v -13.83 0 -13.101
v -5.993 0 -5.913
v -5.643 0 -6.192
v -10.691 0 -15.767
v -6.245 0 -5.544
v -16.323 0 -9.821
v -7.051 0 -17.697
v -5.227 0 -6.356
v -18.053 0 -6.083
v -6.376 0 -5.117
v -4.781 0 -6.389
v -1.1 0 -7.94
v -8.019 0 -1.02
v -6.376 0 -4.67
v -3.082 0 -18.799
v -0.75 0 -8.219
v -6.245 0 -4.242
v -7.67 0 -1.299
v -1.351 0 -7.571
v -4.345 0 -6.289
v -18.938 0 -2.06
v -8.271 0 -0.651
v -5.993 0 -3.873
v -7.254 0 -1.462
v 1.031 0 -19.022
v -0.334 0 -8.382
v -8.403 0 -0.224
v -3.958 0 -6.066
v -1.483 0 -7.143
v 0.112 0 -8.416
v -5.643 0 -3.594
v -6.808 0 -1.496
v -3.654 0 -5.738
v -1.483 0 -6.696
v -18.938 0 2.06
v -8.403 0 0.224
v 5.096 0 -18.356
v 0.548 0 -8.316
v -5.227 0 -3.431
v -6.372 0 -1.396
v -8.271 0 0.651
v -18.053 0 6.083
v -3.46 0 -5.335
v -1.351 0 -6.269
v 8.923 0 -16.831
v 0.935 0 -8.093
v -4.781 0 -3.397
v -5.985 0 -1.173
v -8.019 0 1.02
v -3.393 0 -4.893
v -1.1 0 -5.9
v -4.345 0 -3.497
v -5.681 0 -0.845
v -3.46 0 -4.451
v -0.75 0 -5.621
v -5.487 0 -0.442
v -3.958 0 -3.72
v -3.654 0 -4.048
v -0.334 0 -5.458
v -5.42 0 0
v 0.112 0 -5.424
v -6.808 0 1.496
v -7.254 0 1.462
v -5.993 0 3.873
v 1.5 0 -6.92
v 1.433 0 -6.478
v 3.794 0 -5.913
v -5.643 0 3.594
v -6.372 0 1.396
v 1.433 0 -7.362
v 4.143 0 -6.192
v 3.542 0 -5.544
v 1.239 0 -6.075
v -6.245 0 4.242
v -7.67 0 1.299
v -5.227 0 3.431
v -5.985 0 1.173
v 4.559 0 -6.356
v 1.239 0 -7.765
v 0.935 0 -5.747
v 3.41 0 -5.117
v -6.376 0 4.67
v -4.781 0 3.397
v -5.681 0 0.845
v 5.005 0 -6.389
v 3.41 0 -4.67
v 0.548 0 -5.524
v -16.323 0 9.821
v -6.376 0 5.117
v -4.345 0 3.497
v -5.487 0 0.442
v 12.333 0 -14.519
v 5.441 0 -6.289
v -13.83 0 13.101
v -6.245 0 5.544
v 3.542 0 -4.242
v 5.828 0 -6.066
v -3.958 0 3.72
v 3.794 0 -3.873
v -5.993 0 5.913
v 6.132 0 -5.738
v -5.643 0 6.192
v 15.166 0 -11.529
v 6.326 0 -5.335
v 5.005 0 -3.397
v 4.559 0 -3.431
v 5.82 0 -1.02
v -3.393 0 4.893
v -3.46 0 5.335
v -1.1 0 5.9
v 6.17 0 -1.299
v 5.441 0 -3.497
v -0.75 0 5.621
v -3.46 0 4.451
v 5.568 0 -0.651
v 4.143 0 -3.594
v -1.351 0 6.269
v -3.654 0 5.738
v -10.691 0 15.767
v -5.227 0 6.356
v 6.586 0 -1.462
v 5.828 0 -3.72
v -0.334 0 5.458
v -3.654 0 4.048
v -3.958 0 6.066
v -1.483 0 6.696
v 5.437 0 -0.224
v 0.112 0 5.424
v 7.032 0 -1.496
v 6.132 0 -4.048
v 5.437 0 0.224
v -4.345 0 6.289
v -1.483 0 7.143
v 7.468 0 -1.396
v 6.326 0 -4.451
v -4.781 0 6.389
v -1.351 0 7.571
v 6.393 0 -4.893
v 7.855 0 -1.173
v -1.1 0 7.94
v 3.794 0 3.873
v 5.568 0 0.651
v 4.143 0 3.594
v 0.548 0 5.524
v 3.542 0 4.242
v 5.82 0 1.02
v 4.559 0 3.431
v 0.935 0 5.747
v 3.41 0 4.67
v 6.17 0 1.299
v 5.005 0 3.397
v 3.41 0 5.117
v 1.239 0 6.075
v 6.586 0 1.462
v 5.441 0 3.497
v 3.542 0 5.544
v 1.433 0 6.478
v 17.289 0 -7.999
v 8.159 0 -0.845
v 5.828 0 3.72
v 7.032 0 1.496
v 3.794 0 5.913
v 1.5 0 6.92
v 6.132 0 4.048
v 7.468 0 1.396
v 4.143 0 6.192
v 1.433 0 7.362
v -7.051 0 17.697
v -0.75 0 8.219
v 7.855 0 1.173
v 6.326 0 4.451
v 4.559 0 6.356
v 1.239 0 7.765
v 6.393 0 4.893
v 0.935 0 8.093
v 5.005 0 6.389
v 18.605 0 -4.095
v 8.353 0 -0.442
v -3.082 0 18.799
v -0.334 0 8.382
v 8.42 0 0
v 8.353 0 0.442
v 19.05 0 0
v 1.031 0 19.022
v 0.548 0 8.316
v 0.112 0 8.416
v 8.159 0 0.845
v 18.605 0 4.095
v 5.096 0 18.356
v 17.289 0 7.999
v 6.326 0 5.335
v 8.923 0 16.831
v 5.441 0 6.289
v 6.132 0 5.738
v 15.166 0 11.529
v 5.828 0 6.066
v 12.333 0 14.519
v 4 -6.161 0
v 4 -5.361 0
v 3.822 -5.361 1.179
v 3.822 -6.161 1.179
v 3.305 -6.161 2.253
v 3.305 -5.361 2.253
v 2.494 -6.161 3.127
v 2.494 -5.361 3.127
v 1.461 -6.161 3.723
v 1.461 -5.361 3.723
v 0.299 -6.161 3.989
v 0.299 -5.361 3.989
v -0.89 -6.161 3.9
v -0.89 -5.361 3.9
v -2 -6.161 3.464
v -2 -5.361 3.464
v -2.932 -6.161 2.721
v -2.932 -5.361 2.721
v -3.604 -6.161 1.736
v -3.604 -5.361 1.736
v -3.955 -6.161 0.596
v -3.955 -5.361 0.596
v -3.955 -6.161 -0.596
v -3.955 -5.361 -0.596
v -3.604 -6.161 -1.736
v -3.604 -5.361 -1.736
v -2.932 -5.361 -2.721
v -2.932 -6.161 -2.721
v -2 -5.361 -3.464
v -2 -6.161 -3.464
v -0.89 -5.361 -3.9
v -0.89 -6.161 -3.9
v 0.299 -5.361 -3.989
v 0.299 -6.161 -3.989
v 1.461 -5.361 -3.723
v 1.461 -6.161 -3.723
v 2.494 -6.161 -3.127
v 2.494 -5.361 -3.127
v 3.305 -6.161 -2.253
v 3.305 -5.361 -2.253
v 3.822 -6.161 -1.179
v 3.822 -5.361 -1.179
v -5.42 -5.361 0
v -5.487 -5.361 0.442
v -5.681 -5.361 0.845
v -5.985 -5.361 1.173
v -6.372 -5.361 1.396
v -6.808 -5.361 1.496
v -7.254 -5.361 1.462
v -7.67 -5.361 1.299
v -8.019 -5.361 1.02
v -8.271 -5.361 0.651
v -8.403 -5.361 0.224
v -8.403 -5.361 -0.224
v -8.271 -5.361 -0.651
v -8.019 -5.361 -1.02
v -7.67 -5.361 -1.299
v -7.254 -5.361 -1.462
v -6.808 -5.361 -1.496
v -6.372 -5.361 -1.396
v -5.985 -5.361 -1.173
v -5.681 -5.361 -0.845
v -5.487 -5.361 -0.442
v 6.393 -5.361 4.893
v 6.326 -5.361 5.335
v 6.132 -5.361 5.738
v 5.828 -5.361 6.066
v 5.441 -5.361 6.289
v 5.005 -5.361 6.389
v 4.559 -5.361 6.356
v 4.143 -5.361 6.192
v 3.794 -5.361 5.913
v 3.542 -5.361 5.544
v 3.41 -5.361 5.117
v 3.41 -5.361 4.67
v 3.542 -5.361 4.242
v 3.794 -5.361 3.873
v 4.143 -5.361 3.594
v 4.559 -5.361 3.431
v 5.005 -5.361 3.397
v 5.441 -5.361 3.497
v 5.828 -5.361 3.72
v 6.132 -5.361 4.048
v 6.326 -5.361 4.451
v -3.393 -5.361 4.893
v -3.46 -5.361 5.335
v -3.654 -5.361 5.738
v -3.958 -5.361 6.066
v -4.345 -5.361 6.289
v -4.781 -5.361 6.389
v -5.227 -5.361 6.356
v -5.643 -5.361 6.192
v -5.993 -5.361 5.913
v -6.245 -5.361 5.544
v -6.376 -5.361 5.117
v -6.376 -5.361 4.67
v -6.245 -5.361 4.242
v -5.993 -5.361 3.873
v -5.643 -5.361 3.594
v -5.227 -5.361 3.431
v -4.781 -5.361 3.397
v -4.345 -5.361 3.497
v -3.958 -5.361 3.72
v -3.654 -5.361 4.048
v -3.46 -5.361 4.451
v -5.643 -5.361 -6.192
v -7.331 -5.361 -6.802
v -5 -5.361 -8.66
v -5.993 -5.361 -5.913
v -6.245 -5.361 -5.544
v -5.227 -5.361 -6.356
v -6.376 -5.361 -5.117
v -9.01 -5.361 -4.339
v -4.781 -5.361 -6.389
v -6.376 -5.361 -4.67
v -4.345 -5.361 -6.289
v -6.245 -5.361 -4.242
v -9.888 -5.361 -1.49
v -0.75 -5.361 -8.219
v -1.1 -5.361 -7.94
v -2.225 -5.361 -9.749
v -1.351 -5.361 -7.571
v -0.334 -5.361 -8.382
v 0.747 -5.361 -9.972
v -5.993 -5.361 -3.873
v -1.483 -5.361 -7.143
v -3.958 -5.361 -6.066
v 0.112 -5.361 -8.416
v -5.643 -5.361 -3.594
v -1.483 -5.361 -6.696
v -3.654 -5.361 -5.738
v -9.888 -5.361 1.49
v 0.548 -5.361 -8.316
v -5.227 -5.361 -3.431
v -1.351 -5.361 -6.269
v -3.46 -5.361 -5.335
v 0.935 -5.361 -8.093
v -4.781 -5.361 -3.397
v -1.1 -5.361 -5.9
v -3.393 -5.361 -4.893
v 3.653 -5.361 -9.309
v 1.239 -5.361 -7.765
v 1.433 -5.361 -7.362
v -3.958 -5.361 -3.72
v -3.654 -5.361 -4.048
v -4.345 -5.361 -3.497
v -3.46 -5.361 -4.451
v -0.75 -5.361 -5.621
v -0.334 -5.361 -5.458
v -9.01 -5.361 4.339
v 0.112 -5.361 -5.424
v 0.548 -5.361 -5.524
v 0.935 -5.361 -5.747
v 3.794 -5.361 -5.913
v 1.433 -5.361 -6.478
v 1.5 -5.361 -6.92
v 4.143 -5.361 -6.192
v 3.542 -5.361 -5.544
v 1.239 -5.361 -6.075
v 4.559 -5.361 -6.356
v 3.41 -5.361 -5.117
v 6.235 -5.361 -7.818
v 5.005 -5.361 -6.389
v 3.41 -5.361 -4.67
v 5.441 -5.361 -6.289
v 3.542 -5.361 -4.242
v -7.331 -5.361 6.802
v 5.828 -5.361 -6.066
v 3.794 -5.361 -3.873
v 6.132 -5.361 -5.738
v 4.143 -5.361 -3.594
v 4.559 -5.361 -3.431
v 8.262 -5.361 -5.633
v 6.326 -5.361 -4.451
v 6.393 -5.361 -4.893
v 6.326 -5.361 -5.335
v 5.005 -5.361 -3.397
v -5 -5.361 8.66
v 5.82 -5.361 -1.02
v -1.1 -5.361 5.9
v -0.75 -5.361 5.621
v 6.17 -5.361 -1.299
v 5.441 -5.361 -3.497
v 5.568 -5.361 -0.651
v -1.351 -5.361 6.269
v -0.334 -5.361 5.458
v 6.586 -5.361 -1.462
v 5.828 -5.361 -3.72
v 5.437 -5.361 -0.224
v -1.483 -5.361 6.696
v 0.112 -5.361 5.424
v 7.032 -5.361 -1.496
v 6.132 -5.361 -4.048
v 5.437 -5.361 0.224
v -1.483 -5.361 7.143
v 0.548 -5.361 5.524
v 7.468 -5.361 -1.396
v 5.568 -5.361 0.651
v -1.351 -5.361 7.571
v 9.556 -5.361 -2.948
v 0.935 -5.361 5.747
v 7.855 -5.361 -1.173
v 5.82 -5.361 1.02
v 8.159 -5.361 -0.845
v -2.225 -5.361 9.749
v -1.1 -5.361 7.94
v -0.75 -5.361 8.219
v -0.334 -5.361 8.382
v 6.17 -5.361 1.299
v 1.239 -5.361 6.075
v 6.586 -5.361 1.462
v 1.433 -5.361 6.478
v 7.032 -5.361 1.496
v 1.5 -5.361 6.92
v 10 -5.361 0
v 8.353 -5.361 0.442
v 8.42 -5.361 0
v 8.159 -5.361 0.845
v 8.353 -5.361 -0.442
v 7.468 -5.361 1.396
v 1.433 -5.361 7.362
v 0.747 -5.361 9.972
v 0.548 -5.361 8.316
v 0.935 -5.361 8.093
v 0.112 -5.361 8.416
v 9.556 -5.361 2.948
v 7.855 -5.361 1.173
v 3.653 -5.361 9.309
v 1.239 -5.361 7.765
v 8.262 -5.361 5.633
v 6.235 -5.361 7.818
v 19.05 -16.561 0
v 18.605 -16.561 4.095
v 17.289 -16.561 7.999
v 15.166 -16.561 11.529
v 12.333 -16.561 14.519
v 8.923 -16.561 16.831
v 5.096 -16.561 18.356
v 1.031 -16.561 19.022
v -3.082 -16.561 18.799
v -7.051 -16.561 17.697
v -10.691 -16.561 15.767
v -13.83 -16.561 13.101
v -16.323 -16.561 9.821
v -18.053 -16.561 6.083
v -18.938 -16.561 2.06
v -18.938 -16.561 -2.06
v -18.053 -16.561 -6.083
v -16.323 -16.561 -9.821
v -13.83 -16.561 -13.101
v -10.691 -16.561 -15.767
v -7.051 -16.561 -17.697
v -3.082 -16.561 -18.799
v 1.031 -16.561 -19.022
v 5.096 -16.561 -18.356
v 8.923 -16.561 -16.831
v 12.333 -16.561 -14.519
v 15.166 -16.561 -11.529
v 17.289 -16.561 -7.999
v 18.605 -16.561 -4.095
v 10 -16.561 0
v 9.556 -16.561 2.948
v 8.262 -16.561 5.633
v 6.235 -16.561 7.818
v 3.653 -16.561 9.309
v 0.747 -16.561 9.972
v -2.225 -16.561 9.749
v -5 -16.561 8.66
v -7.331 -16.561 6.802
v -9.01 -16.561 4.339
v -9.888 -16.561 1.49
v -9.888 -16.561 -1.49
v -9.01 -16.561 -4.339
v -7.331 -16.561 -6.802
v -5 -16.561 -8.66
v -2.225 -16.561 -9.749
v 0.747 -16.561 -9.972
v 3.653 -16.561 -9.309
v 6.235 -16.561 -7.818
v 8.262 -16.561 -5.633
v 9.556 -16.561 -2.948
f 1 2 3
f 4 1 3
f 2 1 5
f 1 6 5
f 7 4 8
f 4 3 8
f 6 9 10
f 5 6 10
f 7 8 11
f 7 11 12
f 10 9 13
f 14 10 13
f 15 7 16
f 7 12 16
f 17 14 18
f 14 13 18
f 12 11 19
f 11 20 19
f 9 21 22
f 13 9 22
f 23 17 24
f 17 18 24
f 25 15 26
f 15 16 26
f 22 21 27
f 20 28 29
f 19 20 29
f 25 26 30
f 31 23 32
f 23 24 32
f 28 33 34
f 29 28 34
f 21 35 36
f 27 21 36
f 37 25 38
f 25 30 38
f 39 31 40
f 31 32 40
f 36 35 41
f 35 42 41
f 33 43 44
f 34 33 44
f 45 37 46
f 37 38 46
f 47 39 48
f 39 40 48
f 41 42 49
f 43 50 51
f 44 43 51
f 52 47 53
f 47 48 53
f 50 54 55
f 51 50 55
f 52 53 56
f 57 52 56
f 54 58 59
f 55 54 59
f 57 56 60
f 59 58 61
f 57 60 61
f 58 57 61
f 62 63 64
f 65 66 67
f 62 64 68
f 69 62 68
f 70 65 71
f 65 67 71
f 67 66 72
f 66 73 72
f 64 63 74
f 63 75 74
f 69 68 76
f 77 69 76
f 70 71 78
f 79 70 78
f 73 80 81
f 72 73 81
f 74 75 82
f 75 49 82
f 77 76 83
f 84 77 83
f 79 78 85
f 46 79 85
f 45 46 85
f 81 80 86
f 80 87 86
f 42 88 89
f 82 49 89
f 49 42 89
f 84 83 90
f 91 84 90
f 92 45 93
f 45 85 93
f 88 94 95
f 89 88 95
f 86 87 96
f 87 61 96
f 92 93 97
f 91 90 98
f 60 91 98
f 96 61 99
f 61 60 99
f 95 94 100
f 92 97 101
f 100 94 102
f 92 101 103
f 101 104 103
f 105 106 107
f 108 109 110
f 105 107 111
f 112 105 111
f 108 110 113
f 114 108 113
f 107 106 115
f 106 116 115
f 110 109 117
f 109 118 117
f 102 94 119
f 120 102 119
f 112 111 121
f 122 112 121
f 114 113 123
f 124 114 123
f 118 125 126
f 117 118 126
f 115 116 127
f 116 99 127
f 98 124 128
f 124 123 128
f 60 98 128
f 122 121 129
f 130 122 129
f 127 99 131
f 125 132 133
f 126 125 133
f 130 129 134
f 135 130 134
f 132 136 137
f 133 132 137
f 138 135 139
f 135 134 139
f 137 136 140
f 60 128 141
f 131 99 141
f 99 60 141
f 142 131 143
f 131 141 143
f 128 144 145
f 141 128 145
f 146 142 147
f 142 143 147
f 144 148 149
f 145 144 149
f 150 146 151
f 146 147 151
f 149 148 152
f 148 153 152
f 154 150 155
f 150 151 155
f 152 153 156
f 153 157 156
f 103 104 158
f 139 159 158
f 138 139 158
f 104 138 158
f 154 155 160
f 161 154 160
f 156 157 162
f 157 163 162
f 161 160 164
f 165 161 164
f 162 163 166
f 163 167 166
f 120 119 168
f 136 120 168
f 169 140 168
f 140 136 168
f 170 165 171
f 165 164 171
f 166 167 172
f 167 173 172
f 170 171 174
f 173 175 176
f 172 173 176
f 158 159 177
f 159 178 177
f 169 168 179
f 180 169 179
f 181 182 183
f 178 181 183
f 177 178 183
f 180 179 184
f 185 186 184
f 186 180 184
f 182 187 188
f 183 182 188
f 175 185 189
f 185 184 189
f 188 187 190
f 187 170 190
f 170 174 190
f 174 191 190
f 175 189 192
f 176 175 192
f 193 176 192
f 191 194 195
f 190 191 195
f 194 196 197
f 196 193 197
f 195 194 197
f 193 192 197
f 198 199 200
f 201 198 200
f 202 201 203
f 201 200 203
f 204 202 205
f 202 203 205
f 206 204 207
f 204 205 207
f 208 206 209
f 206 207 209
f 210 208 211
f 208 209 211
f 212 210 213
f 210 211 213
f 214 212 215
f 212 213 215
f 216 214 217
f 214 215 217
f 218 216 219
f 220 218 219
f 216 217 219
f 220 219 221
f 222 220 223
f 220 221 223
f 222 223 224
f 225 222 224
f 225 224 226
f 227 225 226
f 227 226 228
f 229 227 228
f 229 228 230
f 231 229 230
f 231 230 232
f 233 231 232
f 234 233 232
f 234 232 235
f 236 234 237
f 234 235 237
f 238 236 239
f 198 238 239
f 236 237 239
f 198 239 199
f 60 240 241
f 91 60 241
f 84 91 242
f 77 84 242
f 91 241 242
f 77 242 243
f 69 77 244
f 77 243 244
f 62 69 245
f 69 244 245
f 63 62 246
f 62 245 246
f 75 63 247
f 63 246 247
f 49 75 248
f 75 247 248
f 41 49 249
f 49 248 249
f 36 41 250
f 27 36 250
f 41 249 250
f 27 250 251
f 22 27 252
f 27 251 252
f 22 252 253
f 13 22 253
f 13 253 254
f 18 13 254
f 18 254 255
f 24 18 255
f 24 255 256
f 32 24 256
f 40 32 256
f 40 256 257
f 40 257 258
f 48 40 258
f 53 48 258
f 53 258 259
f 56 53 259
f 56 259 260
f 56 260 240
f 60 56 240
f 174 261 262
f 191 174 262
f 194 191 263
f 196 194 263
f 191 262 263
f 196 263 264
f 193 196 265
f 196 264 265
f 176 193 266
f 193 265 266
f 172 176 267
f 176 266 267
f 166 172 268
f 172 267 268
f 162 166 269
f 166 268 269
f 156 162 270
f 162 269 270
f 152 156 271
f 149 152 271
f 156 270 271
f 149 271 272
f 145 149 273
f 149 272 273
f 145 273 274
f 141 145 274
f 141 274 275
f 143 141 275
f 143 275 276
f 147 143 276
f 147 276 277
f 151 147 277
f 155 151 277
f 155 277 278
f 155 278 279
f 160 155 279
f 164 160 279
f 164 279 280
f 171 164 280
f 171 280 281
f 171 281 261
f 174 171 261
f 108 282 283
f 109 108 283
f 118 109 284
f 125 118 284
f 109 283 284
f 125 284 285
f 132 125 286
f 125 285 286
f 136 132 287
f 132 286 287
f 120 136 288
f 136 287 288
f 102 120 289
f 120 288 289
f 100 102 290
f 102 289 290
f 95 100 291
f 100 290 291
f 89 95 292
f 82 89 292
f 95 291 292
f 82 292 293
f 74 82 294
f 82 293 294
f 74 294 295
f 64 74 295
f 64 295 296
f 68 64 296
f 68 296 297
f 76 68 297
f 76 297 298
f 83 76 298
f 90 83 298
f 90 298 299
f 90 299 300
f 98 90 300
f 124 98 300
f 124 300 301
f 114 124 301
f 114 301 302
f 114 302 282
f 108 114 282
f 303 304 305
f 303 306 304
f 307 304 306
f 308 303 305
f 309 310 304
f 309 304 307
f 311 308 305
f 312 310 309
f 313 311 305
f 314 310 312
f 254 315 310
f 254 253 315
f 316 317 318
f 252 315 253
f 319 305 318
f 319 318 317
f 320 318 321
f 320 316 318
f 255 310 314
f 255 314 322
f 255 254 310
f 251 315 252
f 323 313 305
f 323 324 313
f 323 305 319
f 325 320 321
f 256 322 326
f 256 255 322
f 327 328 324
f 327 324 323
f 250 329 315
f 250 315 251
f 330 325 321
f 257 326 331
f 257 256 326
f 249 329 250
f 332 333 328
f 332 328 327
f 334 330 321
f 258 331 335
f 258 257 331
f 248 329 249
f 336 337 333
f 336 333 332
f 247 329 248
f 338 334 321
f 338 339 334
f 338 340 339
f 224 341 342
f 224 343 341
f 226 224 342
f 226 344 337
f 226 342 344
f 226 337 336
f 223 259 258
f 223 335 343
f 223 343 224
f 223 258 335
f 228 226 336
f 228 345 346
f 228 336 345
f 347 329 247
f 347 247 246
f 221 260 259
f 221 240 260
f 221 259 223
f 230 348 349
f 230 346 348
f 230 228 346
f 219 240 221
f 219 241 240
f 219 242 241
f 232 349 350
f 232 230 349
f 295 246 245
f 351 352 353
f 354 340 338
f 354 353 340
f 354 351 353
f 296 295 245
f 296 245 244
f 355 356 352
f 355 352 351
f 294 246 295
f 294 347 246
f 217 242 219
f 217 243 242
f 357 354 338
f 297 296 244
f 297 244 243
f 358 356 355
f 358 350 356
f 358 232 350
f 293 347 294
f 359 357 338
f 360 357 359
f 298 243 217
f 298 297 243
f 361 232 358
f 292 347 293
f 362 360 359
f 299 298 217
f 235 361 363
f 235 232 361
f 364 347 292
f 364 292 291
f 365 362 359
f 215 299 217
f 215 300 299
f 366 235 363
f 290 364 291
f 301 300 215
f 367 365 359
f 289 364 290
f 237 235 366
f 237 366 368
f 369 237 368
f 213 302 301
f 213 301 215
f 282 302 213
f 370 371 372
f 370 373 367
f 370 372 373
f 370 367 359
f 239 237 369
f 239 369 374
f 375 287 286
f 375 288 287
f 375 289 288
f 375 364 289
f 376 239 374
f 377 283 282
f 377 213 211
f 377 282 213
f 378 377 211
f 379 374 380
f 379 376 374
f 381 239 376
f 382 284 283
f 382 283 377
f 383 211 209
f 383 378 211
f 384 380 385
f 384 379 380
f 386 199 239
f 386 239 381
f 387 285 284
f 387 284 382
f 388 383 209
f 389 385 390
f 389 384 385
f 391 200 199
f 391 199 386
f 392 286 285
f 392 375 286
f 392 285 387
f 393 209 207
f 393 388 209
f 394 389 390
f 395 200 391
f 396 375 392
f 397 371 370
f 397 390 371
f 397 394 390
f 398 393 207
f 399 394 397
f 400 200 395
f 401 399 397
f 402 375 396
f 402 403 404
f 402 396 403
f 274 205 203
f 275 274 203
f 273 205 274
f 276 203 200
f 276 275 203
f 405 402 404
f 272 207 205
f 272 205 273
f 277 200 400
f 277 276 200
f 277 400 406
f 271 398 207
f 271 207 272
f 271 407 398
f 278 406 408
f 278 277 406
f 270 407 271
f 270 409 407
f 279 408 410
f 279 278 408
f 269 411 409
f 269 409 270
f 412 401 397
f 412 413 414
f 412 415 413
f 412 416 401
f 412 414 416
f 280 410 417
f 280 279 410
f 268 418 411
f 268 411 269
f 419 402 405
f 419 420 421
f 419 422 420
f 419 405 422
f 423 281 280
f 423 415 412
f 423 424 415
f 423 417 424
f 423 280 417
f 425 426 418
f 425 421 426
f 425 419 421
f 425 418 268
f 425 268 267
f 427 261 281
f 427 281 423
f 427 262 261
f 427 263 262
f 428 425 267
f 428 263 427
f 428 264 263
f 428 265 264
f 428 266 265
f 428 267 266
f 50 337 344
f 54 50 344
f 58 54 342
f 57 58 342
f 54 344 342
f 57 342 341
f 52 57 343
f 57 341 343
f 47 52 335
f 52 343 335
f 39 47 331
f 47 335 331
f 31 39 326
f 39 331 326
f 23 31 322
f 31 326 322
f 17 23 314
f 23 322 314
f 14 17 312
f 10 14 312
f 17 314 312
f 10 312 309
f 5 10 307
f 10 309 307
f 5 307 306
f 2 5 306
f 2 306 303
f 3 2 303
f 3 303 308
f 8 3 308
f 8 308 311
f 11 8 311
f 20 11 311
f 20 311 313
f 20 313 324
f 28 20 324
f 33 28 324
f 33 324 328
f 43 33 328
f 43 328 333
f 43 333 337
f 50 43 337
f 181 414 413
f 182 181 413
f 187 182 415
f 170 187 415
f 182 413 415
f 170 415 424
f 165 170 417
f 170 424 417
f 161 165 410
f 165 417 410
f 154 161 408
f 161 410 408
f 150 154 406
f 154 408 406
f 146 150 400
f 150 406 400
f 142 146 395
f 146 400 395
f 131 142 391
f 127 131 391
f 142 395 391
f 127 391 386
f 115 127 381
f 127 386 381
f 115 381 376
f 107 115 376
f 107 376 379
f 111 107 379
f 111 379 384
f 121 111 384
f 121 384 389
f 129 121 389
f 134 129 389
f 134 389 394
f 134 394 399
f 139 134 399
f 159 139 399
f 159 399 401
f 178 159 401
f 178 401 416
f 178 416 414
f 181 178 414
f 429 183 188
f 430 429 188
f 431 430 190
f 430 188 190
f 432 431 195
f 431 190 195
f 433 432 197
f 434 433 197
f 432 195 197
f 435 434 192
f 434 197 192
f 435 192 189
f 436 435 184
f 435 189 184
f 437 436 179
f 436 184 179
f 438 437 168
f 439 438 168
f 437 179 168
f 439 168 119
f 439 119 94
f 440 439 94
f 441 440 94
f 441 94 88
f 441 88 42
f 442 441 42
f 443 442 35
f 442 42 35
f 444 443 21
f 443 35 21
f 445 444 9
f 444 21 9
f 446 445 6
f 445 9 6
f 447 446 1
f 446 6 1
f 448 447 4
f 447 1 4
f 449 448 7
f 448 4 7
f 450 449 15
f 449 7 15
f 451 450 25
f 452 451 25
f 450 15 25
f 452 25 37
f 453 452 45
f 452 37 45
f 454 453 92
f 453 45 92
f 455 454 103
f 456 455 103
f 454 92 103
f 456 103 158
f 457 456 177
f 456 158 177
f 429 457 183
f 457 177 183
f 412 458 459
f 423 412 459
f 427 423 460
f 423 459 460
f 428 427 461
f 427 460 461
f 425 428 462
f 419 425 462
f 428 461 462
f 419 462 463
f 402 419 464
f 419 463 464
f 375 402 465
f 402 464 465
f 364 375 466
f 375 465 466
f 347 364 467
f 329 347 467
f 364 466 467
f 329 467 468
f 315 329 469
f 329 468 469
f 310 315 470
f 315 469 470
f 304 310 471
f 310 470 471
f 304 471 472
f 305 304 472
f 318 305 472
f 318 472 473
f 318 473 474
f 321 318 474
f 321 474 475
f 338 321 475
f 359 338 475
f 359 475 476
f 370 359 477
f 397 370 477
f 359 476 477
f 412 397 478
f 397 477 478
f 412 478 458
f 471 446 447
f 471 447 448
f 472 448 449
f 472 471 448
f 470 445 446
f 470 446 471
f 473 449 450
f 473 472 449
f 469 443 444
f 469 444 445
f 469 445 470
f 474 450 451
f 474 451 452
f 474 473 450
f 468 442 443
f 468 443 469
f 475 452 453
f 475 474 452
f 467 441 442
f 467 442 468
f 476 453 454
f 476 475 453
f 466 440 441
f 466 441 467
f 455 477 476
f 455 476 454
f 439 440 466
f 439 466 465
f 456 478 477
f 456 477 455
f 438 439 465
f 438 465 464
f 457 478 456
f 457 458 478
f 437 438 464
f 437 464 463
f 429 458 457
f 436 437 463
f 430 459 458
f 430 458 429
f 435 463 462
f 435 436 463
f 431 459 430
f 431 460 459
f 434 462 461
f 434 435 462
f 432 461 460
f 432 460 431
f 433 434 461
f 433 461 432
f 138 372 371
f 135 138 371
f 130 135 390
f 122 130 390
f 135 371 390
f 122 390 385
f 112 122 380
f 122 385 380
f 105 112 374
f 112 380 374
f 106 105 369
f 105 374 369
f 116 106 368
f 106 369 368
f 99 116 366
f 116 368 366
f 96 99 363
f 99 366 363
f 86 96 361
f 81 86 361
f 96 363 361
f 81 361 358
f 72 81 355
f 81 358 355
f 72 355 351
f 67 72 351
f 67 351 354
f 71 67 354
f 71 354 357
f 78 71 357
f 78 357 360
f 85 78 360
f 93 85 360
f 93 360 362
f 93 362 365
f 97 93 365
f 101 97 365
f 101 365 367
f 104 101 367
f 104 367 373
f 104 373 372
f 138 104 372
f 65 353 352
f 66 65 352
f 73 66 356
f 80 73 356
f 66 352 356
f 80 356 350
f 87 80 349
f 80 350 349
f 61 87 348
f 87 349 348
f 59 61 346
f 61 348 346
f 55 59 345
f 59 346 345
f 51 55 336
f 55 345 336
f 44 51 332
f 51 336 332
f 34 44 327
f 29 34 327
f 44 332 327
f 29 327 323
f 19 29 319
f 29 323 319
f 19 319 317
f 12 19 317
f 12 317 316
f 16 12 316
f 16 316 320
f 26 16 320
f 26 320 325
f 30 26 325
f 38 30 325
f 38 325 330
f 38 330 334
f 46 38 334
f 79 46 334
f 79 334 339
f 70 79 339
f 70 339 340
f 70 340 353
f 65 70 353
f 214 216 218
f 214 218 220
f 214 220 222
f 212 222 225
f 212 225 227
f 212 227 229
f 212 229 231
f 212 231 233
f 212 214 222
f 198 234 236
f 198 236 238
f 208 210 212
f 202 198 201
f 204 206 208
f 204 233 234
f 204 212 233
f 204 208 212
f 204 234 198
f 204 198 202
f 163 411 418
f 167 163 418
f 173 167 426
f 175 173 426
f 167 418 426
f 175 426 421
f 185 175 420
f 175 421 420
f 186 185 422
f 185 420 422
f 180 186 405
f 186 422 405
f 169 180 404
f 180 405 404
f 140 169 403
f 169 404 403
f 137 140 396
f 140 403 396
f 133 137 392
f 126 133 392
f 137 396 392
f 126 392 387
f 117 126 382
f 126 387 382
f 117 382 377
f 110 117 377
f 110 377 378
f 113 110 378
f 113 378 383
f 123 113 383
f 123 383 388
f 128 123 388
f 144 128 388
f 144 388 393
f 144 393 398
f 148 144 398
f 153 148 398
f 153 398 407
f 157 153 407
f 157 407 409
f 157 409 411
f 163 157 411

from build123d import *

# Parameters (mm, degrees)
F0_R     = 19.05
F1_DEPTH = 16.5608
F2_R     = 10
F3_DEPTH = 11.2
F4_R     = 4
F5_DEPTH = 0.8
F8_R     = 1.5
F9_DEPTH = 6


# Not quite as in the source:
# - the program builds the solid bodies; features that only make, move or delete a surface that nothing else refers to are left out


with BuildPart() as f1:
    # F0 (on Front) → F1 (new body)
    with BuildSketch(Plane.XZ):
        Circle(F0_R)
    extrude(amount=F1_DEPTH)

    # F2 (on face) → F3 (cut)
    with BuildSketch(Plane.XZ.offset(16.5608)):
        Circle(F2_R)
    extrude(amount=-F3_DEPTH, mode=Mode.SUBTRACT)

    # F4 (on face) → F5 (join)
    with BuildSketch(Plane.XZ.offset(5.3608)):
        Circle(F4_R)
    extrude(amount=F5_DEPTH)

    # F8 (on face) → F9 (cut)
    with BuildSketch(Plane.XZ.offset(5.3608)):
        with Locations((0, 6.9199060356)):
            Circle(F8_R)
        with Locations((-4.8931124829, 4.8931124829)):
            Circle(F8_R)
        with Locations((-6.9199060356, 0)):
            Circle(F8_R)
        with Locations((-4.8931124829, -4.8931124829)):
            Circle(F8_R)
        with Locations((0, -6.9199060356)):
            Circle(F8_R)
        with Locations((4.8931124829, -4.8931124829)):
            Circle(F8_R)
        with Locations((6.9199060356, 0)):
            Circle(F8_R)
        with Locations((4.8931124829, 4.8931124829)):
            Circle(F8_R)
    extrude(amount=-F9_DEPTH, mode=Mode.SUBTRACT)


solid = f1.part
